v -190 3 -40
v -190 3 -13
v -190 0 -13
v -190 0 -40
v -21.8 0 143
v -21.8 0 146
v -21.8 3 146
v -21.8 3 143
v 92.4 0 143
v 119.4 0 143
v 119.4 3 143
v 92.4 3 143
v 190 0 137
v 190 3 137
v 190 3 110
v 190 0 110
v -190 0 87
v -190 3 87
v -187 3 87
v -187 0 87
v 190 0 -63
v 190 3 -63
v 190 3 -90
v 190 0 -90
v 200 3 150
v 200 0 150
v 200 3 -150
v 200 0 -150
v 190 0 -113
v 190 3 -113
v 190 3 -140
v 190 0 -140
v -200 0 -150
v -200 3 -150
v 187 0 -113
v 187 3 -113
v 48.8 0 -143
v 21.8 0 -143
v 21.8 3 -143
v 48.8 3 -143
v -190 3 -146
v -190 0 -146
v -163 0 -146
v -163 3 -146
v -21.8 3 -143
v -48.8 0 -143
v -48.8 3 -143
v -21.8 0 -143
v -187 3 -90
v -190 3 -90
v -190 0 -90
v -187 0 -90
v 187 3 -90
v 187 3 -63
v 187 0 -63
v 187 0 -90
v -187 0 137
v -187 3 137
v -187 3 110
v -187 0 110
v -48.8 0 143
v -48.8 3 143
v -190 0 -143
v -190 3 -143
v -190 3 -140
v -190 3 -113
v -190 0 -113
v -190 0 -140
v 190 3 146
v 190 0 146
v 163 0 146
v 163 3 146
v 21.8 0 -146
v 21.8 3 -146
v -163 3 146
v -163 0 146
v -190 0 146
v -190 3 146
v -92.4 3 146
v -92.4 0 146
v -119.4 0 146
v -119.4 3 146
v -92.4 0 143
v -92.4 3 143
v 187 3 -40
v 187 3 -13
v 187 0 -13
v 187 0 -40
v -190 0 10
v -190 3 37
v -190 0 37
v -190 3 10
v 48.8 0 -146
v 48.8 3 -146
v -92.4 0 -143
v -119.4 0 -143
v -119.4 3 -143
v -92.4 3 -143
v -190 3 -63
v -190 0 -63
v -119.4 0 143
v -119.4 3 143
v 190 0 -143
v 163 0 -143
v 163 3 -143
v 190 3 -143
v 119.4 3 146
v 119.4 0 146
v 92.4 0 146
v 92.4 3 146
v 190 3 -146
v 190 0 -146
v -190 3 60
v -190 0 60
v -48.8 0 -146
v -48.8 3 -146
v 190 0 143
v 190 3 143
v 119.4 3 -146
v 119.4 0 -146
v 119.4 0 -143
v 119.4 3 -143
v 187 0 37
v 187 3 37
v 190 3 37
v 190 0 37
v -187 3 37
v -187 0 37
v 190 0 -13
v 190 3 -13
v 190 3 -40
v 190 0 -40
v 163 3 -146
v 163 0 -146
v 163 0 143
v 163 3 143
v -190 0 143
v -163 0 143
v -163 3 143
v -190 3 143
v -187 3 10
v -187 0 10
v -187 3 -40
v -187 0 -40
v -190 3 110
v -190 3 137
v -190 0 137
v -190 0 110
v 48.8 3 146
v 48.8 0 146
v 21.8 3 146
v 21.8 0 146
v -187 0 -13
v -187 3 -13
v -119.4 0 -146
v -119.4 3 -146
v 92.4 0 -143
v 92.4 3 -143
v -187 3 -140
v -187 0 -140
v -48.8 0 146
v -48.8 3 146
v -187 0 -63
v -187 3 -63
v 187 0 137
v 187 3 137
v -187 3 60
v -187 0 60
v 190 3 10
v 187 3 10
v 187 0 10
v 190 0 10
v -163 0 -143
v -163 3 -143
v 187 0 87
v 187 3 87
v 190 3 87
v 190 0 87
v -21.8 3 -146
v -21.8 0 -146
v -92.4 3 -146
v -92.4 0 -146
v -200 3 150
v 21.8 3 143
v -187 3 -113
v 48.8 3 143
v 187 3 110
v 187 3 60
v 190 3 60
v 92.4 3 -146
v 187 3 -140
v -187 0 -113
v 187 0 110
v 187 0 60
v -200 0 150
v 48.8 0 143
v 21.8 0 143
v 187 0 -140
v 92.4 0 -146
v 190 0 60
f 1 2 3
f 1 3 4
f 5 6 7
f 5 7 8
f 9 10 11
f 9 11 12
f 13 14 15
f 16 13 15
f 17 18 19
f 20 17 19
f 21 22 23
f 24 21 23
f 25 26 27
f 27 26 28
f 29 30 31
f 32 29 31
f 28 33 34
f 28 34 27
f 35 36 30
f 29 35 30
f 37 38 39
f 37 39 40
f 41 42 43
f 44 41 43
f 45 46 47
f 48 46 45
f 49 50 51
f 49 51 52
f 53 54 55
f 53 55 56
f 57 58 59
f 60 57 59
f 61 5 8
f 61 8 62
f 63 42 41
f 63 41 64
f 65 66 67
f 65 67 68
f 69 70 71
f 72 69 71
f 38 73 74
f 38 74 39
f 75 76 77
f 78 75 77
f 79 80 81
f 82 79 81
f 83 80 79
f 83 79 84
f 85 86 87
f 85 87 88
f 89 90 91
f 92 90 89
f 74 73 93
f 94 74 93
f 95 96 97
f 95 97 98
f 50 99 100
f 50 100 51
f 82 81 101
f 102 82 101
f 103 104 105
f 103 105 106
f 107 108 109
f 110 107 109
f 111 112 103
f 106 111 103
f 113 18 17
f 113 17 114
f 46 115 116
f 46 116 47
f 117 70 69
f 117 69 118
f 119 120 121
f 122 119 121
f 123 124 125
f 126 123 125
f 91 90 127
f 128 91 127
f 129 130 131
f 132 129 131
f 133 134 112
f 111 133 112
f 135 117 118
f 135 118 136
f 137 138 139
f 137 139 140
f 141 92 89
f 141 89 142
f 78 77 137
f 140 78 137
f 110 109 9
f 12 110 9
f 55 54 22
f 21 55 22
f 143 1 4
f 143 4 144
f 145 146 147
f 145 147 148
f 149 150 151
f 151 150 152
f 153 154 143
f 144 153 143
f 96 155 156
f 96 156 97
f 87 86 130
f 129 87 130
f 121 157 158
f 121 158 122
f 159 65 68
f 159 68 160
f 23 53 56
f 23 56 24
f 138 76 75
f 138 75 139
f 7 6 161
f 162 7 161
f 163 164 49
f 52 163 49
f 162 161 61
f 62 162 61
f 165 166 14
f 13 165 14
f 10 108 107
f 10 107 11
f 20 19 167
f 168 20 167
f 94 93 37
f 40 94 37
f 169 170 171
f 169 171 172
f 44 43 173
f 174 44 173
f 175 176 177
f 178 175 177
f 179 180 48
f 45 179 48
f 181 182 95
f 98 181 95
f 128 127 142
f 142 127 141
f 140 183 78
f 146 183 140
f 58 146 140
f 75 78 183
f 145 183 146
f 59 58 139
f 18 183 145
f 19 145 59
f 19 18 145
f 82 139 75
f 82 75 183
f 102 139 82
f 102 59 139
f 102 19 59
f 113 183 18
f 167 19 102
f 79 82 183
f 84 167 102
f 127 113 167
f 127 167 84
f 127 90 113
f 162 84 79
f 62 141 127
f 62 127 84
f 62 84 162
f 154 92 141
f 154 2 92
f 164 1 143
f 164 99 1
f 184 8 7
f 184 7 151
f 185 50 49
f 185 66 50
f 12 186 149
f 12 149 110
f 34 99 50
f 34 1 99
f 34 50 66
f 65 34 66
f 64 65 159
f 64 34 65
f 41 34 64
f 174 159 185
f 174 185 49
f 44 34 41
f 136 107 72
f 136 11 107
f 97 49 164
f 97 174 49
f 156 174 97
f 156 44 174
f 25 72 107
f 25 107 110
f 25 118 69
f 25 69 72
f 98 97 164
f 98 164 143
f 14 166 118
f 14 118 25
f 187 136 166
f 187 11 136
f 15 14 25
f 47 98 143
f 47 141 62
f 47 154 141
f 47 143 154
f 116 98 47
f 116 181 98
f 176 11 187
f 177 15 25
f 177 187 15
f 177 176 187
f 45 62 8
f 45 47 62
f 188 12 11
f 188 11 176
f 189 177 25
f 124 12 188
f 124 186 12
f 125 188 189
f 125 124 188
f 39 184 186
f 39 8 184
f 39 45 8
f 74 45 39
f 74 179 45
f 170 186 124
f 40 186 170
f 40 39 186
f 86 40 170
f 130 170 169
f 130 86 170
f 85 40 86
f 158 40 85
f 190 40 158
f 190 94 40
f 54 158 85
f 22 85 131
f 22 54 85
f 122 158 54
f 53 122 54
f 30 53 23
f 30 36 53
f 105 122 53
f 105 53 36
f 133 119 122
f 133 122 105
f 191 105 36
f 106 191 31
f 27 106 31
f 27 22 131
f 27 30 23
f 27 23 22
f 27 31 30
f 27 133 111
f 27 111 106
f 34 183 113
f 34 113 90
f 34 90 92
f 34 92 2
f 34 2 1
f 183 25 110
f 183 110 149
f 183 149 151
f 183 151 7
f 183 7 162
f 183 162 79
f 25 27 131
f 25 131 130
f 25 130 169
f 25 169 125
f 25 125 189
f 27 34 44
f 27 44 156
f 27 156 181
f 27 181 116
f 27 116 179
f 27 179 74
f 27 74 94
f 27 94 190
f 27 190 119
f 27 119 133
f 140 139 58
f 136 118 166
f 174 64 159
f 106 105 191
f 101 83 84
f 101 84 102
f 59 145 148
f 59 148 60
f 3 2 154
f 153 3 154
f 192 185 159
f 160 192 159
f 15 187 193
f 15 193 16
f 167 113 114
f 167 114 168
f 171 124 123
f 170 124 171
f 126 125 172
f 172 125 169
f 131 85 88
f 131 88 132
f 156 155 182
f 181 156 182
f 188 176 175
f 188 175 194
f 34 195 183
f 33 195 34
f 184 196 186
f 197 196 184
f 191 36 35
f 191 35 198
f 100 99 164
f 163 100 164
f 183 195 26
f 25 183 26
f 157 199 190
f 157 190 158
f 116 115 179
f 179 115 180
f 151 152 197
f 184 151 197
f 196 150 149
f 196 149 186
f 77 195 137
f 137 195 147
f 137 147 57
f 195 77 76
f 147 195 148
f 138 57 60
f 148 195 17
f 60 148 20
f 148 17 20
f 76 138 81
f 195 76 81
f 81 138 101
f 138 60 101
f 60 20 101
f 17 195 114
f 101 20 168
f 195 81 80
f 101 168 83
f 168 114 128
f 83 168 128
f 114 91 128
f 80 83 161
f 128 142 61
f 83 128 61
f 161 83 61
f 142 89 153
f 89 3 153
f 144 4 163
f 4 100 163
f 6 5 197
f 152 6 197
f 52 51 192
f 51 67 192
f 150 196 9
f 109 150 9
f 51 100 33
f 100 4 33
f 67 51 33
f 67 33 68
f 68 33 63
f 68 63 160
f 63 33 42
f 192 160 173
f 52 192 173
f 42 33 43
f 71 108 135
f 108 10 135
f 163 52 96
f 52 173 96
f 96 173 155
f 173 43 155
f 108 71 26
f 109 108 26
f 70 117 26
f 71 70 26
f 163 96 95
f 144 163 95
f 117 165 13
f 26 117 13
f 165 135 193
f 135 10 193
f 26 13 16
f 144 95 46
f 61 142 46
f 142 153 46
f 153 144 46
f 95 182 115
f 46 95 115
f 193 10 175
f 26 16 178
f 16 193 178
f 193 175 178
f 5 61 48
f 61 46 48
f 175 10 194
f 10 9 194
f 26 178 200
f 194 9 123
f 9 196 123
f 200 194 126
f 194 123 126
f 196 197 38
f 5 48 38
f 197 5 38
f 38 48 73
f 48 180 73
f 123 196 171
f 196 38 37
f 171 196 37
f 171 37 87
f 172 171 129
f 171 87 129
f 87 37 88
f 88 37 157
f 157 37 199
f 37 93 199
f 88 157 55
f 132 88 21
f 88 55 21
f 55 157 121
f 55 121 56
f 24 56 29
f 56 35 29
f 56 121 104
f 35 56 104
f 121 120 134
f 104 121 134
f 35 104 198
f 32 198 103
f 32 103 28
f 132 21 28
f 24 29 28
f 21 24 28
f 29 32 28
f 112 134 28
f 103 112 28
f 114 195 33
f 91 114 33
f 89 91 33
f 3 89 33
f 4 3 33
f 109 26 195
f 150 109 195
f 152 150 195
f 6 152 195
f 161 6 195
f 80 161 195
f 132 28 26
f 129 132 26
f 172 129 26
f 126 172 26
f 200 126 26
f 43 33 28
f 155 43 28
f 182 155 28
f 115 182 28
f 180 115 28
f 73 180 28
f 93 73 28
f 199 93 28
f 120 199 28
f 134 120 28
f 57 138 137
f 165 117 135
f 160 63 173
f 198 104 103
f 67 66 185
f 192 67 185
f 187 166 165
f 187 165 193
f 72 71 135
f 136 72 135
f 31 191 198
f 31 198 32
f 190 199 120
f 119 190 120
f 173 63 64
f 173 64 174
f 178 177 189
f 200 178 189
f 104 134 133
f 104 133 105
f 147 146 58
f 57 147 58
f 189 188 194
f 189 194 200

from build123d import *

# Parameters (mm, degrees)
SKETCH1_W           = 400
SKETCH1_H           = 300
BOSS_EXTRUDE2_DEPTH = 3
SKETCH5_W           = 3
SKETCH5_H           = 27
CUT_EXTRUDE4_DEPTH  = 3
SKETCH6_W           = 3
SKETCH6_H           = 27
CUT_EXTRUDE5_DEPTH  = 3
SKETCH12_W          = 27
SKETCH12_H          = 3
CUT_EXTRUDE10_DEPTH = 10
SKETCH13_W          = 27
SKETCH13_H          = 3
CUT_EXTRUDE11_DEPTH = 10


with BuildPart() as part:
    # Sketch1 → Boss-Extrude2 (new body)
    with BuildSketch(Plane(origin=(0, 0, 0), x_dir=(1, 0, 0), z_dir=(0, 1, 0))):
        Rectangle(SKETCH1_W, SKETCH1_H)
    extrude(amount=BOSS_EXTRUDE2_DEPTH)

    # Sketch5 → Cut-Extrude4 (cut)
    with BuildSketch(Plane(origin=(0, 3, 0), x_dir=(1, 0, 0), z_dir=(0, 1, 0))):
        with Locations((-188.5, 126.5)):
            Rectangle(SKETCH5_W, SKETCH5_H)
        with Locations((-188.5, 76.5)):
            Rectangle(SKETCH5_W, SKETCH5_H)
        with Locations((-188.5, 26.5)):
            Rectangle(SKETCH5_W, SKETCH5_H)
        with Locations((-188.5, -23.5)):
            Rectangle(SKETCH5_W, SKETCH5_H)
        with Locations((-188.5, -73.5)):
            Rectangle(SKETCH5_W, SKETCH5_H)
        with Locations((-188.5, -123.5)):
            Rectangle(SKETCH5_W, SKETCH5_H)
    extrude(amount=-CUT_EXTRUDE4_DEPTH, mode=Mode.SUBTRACT)

    # Sketch6 → Cut-Extrude5 (cut)
    with BuildSketch(Plane(origin=(0, 3, 0), x_dir=(1, 0, 0), z_dir=(0, 1, 0))):
        with Locations((188.5, 126.5)):
            Rectangle(SKETCH6_W, SKETCH6_H)
        with Locations((188.5, 76.5)):
            Rectangle(SKETCH6_W, SKETCH6_H)
        with Locations((188.5, 26.5)):
            Rectangle(SKETCH6_W, SKETCH6_H)
        with Locations((188.5, -23.5)):
            Rectangle(SKETCH6_W, SKETCH6_H)
        with Locations((188.5, -73.5)):
            Rectangle(SKETCH6_W, SKETCH6_H)
        with Locations((188.5, -123.5)):
            Rectangle(SKETCH6_W, SKETCH6_H)
    extrude(amount=-CUT_EXTRUDE5_DEPTH, mode=Mode.SUBTRACT)

    # Sketch12 → Cut-Extrude10 (cut)
    with BuildSketch(Plane.XZ):
        with Locations((-176.5, -144.5)):
            Rectangle(SKETCH12_W, SKETCH12_H)
        with Locations((-105.9, -144.5)):
            Rectangle(SKETCH12_W, SKETCH12_H)
        with Locations((-35.3, -144.5)):
            Rectangle(SKETCH12_W, SKETCH12_H)
        with Locations((35.3, -144.5)):
            Rectangle(SKETCH12_W, SKETCH12_H)
        with Locations((105.9, -144.5)):
            Rectangle(SKETCH12_W, SKETCH12_H)
        with Locations((176.5, -144.5)):
            Rectangle(SKETCH12_W, SKETCH12_H)
    extrude(amount=-CUT_EXTRUDE10_DEPTH, mode=Mode.SUBTRACT)

    # Sketch13 → Cut-Extrude11 (cut)
    with BuildSketch(Plane(origin=(0, 0, 0), x_dir=(-1, 0, 0), z_dir=(0, -1, 0))):
        with Locations((176.5, -144.5)):
            Rectangle(SKETCH13_W, SKETCH13_H)
        with Locations((105.9, -144.5)):
            Rectangle(SKETCH13_W, SKETCH13_H)
        with Locations((35.3, -144.5)):
            Rectangle(SKETCH13_W, SKETCH13_H)
        with Locations((-35.3, -144.5)):
            Rectangle(SKETCH13_W, SKETCH13_H)
        with Locations((-105.9, -144.5)):
            Rectangle(SKETCH13_W, SKETCH13_H)
        with Locations((-176.5, -144.5)):
            Rectangle(SKETCH13_W, SKETCH13_H)
    extrude(amount=-CUT_EXTRUDE11_DEPTH, mode=Mode.SUBTRACT)


solid = part.part
